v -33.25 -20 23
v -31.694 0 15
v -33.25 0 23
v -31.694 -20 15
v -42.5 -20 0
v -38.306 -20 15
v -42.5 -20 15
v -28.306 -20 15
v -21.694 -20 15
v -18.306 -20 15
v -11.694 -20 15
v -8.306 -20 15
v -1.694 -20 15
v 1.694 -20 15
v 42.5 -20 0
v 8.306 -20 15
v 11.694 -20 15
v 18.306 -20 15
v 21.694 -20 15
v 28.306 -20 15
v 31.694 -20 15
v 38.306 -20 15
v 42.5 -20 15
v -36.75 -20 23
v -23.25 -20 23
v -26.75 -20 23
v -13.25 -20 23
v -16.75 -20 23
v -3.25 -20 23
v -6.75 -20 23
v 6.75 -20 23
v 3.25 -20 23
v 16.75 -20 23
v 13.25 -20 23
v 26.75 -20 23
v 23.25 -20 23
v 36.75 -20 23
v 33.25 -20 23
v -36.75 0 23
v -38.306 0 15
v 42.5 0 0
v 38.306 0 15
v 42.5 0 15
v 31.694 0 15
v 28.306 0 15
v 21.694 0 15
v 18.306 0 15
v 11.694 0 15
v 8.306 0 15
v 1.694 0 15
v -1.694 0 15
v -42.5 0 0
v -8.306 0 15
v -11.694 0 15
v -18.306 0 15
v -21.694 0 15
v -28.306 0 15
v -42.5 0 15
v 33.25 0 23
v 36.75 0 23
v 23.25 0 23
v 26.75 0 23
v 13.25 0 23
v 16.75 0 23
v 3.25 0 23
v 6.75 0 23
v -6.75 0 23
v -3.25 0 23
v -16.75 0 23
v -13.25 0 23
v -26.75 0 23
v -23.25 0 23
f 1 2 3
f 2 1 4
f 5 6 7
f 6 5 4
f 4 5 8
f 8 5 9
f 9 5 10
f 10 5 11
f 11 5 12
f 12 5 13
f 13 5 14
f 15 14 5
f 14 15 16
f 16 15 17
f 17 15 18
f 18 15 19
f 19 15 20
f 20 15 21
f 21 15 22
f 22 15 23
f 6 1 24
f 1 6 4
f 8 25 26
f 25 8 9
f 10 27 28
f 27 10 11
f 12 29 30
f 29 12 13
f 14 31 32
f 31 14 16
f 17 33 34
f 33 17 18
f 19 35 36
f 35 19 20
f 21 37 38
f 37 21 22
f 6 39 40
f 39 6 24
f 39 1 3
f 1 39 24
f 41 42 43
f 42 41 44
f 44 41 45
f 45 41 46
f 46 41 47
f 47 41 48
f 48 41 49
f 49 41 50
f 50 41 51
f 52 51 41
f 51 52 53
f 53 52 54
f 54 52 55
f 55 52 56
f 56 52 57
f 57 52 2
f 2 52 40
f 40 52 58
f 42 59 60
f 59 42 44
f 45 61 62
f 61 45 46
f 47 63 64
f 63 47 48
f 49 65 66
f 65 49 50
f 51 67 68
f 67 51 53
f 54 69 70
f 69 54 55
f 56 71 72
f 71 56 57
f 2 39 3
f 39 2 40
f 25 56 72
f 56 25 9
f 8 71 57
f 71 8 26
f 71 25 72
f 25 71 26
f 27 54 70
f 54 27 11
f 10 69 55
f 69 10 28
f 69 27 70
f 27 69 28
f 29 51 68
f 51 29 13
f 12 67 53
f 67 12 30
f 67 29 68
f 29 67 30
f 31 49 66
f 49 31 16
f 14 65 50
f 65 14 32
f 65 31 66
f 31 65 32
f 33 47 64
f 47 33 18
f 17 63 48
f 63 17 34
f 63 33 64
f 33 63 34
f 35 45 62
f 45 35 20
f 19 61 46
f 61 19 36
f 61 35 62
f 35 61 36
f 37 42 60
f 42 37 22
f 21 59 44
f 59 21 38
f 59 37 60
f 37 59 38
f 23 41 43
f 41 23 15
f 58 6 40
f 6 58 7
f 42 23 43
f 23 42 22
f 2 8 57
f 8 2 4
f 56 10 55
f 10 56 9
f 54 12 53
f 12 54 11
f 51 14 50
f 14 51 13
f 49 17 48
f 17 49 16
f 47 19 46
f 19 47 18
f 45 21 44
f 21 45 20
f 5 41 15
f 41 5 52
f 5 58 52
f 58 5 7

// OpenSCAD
$fn = 32;

// ----------------------------------------------------------------------
// Toothed rack, 8 teeth
// 10 mm pitch, 8 mm teeth
// ----------------------------------------------------------------------

// --- parameters (mm) ---
bar_w = 20;     // bar width (Y)
bar_h = 15;     // bar height (Z)
teeth = 8;      // number of teeth
pitch = 10;     // tooth pitch
tooth_h = 8;    // tooth height above the bar
root_w = 7;     // tooth width at the root
crest_w = 3.5;  // tooth width at the crest

// --- derived feature positions (mm) ---
span = (teeth - 1) * pitch;  // = 70   distance between the outer teeth
bar_l = span + root_w + 8;   // = 85   bar length: teeth plus 4 mm at each end
tooth_x = -span / 2;         // = -35   X of the first tooth
height = bar_h + tooth_h;    // = 23   overall height
feature_centers = [
  [tooth_x + 0 * pitch, -bar_w / 2],
  [tooth_x + 1 * pitch, -bar_w / 2],
  [tooth_x + 2 * pitch, -bar_w / 2],
  [tooth_x + 3 * pitch, -bar_w / 2],
  [tooth_x + 4 * pitch, -bar_w / 2],
  [tooth_x + 5 * pitch, -bar_w / 2],
  [tooth_x + 6 * pitch, -bar_w / 2],
  [tooth_x + 7 * pitch, -bar_w / 2]
];   // tooth centre line, drives the tooth loop

// bar with a rack of teeth, one extruded trapezoium per centre
module rack_tooth() {
  linear_extrude(height = bar_w)
    polygon(points = [
      [0, 0],
      [root_w, 0],
      [root_w / 2 + crest_w / 2, tooth_h + 1],
      [root_w / 2 - crest_w / 2, tooth_h + 1]
    ]);
}

union() {
  translate([-bar_l / 2, -bar_w, 0]) cube([bar_l, bar_w, bar_h]);
  for (centre = feature_centers)
    translate([centre[0] - root_w / 2, 0, bar_h - 1]) rotate([90, 0, 0]) rack_tooth();
}
